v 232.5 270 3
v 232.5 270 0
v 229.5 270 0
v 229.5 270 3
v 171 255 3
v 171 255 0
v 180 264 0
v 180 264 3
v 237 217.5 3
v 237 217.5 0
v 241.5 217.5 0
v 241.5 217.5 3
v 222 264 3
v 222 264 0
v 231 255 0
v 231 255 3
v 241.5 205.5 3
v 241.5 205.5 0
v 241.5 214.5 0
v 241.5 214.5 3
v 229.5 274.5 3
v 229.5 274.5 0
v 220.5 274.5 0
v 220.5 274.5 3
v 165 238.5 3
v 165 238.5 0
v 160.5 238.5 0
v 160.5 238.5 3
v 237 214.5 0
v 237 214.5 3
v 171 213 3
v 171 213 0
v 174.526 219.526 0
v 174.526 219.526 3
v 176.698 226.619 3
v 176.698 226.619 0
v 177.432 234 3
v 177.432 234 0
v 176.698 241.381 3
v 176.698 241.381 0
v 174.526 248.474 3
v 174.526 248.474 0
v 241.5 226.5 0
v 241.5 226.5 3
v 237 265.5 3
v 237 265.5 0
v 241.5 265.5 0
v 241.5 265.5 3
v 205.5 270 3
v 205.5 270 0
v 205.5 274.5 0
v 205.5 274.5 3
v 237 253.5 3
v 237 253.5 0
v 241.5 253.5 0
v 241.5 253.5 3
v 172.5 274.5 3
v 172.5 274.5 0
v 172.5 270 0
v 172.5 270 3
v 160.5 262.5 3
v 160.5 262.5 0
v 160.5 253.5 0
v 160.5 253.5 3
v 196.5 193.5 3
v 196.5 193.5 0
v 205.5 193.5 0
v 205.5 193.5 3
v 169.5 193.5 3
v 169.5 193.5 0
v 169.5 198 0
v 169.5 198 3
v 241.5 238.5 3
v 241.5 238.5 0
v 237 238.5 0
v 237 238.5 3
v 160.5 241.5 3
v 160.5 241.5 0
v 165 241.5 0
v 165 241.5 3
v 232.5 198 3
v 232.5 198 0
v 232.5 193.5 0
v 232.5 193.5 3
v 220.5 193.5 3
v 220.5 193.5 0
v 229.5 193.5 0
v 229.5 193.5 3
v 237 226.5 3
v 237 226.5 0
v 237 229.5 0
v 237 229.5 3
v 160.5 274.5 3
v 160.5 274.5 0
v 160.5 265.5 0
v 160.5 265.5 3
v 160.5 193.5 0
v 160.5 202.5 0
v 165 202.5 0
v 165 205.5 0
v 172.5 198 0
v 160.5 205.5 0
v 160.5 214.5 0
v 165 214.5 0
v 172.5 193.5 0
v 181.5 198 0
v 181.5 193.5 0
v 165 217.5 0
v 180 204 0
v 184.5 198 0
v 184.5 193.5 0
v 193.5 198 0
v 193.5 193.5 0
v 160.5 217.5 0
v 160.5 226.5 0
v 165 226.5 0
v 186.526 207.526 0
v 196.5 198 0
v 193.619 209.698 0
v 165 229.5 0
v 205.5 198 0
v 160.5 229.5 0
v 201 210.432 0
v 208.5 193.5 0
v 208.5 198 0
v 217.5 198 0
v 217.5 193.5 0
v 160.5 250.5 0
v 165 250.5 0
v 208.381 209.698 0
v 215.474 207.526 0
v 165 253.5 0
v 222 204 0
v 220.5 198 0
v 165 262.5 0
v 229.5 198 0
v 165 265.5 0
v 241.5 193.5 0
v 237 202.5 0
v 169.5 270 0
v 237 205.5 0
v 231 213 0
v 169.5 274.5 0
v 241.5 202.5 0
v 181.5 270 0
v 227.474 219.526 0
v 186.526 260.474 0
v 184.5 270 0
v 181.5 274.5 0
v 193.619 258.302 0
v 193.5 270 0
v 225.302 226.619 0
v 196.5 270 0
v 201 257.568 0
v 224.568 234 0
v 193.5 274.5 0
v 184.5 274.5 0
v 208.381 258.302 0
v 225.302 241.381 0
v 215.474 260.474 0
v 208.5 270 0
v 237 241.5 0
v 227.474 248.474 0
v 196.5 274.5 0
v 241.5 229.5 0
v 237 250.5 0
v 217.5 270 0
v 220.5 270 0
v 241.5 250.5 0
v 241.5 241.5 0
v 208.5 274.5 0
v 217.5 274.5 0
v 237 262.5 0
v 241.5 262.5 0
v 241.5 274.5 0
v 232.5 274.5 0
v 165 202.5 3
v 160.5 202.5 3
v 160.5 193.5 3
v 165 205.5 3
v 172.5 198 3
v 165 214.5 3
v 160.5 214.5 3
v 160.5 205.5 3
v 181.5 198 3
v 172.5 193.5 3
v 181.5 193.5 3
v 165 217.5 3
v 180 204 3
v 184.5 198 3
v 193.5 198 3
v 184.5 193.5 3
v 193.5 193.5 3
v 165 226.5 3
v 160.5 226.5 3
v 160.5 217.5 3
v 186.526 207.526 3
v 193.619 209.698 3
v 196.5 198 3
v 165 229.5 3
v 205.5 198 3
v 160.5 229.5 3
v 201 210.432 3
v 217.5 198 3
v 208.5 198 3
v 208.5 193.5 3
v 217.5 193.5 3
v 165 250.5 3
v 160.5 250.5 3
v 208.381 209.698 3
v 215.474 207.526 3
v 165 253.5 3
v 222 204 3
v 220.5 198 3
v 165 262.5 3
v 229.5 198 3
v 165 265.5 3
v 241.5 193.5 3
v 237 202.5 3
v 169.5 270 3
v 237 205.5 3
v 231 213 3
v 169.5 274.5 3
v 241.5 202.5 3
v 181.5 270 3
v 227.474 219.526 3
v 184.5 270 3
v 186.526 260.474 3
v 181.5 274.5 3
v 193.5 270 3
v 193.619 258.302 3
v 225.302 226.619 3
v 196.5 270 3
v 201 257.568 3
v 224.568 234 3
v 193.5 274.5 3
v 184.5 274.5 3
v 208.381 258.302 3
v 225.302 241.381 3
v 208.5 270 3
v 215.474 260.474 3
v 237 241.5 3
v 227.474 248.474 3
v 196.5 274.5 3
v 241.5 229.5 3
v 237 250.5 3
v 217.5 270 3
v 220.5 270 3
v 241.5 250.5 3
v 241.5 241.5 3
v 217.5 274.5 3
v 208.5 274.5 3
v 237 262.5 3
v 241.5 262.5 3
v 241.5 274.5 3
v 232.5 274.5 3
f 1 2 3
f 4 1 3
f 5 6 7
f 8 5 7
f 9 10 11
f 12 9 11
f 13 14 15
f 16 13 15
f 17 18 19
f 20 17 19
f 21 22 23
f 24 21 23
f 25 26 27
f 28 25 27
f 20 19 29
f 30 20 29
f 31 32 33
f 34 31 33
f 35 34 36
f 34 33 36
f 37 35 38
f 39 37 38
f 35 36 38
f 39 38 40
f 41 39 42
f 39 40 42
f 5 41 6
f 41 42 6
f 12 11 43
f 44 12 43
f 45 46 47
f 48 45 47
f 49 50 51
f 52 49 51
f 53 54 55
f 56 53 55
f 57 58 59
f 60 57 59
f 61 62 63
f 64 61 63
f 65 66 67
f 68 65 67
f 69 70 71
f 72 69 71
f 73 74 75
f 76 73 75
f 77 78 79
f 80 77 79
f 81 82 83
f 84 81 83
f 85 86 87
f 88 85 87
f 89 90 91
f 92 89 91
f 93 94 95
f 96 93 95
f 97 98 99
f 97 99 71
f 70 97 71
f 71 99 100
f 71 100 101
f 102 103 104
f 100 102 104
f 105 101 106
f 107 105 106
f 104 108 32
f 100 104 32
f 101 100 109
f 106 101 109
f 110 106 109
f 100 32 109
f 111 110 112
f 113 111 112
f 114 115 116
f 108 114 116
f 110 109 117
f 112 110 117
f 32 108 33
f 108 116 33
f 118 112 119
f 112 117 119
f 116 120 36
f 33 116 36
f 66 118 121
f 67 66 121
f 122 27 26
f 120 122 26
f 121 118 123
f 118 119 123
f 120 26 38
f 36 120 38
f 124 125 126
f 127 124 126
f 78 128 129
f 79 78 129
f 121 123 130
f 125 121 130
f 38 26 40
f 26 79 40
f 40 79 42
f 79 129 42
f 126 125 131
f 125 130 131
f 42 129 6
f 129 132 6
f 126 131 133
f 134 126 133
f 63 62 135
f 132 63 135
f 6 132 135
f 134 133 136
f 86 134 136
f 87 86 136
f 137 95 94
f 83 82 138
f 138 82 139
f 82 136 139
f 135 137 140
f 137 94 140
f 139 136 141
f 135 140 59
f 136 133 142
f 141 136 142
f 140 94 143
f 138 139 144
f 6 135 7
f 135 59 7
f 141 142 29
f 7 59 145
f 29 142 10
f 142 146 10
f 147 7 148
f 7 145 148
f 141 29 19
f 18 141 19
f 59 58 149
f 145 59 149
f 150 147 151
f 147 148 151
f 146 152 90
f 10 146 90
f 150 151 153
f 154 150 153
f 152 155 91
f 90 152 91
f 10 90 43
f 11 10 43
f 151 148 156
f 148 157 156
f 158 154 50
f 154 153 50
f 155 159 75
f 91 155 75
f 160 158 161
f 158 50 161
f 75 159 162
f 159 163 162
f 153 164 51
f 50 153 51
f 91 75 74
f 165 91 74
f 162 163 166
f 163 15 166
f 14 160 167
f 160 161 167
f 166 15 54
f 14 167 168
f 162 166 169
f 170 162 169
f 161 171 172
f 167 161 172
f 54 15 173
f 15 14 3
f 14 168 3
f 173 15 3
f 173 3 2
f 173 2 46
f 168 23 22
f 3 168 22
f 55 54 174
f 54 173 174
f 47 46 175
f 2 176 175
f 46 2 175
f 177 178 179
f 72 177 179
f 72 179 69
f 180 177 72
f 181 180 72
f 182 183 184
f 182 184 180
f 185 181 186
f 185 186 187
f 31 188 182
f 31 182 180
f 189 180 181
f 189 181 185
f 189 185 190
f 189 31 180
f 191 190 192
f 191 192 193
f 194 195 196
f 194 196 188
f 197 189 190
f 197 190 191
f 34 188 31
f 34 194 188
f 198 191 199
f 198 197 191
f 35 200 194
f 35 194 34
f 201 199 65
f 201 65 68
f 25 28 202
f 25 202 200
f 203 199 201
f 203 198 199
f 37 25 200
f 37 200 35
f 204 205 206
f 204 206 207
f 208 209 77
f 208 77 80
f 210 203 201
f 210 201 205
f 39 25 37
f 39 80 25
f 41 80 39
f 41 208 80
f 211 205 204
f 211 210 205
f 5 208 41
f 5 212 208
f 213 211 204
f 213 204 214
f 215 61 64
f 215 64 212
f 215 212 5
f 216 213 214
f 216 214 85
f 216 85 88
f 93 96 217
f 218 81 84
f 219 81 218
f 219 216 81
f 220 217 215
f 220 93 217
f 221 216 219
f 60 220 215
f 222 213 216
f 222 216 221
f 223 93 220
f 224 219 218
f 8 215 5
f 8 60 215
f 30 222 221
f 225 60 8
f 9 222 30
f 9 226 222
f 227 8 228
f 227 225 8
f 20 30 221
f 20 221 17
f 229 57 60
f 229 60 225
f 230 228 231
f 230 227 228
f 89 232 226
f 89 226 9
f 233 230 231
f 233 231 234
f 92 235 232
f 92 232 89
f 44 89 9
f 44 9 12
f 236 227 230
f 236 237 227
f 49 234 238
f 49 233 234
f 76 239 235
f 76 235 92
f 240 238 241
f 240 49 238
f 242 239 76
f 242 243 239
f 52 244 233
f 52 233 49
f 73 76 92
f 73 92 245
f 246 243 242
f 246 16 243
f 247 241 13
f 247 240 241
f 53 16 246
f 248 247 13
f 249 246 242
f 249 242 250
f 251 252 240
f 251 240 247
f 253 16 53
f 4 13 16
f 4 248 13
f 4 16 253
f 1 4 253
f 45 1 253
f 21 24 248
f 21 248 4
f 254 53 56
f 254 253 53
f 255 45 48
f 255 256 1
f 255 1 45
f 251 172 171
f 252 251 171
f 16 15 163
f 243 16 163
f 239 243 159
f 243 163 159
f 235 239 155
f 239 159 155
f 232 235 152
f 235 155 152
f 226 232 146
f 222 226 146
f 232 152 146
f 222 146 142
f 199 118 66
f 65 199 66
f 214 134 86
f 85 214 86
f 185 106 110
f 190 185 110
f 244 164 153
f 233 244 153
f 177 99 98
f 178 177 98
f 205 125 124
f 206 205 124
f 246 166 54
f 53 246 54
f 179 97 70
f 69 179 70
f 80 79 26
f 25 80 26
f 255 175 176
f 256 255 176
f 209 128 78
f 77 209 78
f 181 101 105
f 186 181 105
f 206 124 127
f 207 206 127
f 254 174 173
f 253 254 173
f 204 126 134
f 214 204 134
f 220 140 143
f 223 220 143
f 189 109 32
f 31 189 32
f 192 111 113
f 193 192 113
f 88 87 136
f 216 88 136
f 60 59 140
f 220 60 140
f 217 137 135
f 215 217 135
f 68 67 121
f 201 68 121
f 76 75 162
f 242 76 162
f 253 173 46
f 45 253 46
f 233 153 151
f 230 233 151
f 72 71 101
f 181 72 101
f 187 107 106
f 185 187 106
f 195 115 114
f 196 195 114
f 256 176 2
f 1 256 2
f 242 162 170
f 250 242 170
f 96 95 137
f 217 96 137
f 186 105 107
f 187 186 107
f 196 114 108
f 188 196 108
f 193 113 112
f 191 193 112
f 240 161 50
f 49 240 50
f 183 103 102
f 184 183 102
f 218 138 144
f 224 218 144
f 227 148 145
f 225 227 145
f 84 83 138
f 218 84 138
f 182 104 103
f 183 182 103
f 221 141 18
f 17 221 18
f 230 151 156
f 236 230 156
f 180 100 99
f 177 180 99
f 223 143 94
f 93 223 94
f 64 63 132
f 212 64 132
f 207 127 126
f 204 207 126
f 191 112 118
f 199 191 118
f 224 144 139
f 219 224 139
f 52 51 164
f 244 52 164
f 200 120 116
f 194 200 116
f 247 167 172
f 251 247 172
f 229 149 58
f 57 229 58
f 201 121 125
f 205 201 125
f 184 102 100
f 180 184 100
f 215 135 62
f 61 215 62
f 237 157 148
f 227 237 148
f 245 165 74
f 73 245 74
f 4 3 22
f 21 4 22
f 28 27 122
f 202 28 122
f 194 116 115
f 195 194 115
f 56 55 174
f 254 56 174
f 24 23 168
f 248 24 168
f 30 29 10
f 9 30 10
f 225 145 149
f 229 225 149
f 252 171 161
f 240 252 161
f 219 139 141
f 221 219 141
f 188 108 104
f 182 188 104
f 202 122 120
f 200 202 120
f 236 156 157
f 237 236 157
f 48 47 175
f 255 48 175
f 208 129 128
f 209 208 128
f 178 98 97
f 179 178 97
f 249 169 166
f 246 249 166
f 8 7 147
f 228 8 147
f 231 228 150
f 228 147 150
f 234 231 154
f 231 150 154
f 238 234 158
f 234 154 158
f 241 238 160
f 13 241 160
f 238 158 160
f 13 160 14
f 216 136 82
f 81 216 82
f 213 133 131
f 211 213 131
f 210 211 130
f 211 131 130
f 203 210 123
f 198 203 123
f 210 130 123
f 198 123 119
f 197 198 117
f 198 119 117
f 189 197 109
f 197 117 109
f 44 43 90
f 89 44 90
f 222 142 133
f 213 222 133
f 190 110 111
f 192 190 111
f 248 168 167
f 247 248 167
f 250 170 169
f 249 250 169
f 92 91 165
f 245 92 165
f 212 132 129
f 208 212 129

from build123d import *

# Parameters (mm, degrees)
BOSS_EXTRUDE1_DEPTH = 3


with BuildPart() as part:
    # Sketch1 → Boss-Extrude1 (new body)
    with BuildSketch(Plane.XY):
        Polygon((237, 253.5), (241.5, 253.5), (241.5, 262.5), (237, 262.5), (237, 265.5), (241.5, 265.5), (241.5, 274.5), (232.5, 274.5), (232.5, 270), (229.5, 270), (229.5, 274.5), (220.5, 274.5), (220.5, 270), (217.5, 270), (217.5, 274.5), (208.5, 274.5), (208.5, 270), (205.5, 270), (205.5, 274.5), (196.5, 274.5), (196.5, 270), (193.5, 270), (193.5, 274.5), (184.5, 274.5), (184.5, 270), (181.5, 270), (181.5, 274.5), (172.5, 274.5), (172.5, 270), (169.5, 270), (169.5, 274.5), (160.5, 274.5), (160.5, 265.5), (165, 265.5), (165, 262.5), (160.5, 262.5), (160.5, 253.5), (165, 253.5), (165, 250.5), (160.5, 250.5), (160.5, 241.5), (165, 241.5), (165, 238.5), (160.5, 238.5), (160.5, 229.5), (165, 229.5), (165, 226.5), (160.5, 226.5), (160.5, 217.5), (165, 217.5), (165, 214.5), (160.5, 214.5), (160.5, 205.5), (165, 205.5), (165, 202.5), (160.5, 202.5), (160.5, 193.5), (169.5, 193.5), (169.5, 198), (172.5, 198), (172.5, 193.5), (181.5, 193.5), (181.5, 198), (184.5, 198), (184.5, 193.5), (193.5, 193.5), (193.5, 198), (196.5, 198), (196.5, 193.5), (205.5, 193.5), (205.5, 198), (208.5, 198), (208.5, 193.5), (217.5, 193.5), (217.5, 198), (220.5, 198), (220.5, 193.5), (229.5, 193.5), (229.5, 198), (232.5, 198), (232.5, 193.5), (241.5, 193.5), (241.5, 202.5), (237, 202.5), (237, 205.5), (241.5, 205.5), (241.5, 214.5), (237, 214.5), (237, 217.5), (241.5, 217.5), (241.5, 226.5), (237, 226.5), (237, 229.5), (241.5, 229.5), (241.5, 238.5), (237, 238.5), (237, 241.5), (241.5, 241.5), (241.5, 250.5), (237, 250.5), align=None)
        with BuildLine():
            Line((180, 204), (171, 213))
            ThreePointArc((171, 213), (177.431527234, 234), (171, 255))
            Line((171, 255), (180, 264))
            ThreePointArc((180, 264), (201, 257.568472766), (222, 264))
            Line((222, 264), (231, 255))
            ThreePointArc((231, 255), (224.568472766, 234), (231, 213))
            Line((231, 213), (222, 204))
            ThreePointArc((222, 204), (201, 210.431527234), (180, 204))
        make_face(mode=Mode.SUBTRACT)
    extrude(amount=BOSS_EXTRUDE1_DEPTH)


solid = part.part
